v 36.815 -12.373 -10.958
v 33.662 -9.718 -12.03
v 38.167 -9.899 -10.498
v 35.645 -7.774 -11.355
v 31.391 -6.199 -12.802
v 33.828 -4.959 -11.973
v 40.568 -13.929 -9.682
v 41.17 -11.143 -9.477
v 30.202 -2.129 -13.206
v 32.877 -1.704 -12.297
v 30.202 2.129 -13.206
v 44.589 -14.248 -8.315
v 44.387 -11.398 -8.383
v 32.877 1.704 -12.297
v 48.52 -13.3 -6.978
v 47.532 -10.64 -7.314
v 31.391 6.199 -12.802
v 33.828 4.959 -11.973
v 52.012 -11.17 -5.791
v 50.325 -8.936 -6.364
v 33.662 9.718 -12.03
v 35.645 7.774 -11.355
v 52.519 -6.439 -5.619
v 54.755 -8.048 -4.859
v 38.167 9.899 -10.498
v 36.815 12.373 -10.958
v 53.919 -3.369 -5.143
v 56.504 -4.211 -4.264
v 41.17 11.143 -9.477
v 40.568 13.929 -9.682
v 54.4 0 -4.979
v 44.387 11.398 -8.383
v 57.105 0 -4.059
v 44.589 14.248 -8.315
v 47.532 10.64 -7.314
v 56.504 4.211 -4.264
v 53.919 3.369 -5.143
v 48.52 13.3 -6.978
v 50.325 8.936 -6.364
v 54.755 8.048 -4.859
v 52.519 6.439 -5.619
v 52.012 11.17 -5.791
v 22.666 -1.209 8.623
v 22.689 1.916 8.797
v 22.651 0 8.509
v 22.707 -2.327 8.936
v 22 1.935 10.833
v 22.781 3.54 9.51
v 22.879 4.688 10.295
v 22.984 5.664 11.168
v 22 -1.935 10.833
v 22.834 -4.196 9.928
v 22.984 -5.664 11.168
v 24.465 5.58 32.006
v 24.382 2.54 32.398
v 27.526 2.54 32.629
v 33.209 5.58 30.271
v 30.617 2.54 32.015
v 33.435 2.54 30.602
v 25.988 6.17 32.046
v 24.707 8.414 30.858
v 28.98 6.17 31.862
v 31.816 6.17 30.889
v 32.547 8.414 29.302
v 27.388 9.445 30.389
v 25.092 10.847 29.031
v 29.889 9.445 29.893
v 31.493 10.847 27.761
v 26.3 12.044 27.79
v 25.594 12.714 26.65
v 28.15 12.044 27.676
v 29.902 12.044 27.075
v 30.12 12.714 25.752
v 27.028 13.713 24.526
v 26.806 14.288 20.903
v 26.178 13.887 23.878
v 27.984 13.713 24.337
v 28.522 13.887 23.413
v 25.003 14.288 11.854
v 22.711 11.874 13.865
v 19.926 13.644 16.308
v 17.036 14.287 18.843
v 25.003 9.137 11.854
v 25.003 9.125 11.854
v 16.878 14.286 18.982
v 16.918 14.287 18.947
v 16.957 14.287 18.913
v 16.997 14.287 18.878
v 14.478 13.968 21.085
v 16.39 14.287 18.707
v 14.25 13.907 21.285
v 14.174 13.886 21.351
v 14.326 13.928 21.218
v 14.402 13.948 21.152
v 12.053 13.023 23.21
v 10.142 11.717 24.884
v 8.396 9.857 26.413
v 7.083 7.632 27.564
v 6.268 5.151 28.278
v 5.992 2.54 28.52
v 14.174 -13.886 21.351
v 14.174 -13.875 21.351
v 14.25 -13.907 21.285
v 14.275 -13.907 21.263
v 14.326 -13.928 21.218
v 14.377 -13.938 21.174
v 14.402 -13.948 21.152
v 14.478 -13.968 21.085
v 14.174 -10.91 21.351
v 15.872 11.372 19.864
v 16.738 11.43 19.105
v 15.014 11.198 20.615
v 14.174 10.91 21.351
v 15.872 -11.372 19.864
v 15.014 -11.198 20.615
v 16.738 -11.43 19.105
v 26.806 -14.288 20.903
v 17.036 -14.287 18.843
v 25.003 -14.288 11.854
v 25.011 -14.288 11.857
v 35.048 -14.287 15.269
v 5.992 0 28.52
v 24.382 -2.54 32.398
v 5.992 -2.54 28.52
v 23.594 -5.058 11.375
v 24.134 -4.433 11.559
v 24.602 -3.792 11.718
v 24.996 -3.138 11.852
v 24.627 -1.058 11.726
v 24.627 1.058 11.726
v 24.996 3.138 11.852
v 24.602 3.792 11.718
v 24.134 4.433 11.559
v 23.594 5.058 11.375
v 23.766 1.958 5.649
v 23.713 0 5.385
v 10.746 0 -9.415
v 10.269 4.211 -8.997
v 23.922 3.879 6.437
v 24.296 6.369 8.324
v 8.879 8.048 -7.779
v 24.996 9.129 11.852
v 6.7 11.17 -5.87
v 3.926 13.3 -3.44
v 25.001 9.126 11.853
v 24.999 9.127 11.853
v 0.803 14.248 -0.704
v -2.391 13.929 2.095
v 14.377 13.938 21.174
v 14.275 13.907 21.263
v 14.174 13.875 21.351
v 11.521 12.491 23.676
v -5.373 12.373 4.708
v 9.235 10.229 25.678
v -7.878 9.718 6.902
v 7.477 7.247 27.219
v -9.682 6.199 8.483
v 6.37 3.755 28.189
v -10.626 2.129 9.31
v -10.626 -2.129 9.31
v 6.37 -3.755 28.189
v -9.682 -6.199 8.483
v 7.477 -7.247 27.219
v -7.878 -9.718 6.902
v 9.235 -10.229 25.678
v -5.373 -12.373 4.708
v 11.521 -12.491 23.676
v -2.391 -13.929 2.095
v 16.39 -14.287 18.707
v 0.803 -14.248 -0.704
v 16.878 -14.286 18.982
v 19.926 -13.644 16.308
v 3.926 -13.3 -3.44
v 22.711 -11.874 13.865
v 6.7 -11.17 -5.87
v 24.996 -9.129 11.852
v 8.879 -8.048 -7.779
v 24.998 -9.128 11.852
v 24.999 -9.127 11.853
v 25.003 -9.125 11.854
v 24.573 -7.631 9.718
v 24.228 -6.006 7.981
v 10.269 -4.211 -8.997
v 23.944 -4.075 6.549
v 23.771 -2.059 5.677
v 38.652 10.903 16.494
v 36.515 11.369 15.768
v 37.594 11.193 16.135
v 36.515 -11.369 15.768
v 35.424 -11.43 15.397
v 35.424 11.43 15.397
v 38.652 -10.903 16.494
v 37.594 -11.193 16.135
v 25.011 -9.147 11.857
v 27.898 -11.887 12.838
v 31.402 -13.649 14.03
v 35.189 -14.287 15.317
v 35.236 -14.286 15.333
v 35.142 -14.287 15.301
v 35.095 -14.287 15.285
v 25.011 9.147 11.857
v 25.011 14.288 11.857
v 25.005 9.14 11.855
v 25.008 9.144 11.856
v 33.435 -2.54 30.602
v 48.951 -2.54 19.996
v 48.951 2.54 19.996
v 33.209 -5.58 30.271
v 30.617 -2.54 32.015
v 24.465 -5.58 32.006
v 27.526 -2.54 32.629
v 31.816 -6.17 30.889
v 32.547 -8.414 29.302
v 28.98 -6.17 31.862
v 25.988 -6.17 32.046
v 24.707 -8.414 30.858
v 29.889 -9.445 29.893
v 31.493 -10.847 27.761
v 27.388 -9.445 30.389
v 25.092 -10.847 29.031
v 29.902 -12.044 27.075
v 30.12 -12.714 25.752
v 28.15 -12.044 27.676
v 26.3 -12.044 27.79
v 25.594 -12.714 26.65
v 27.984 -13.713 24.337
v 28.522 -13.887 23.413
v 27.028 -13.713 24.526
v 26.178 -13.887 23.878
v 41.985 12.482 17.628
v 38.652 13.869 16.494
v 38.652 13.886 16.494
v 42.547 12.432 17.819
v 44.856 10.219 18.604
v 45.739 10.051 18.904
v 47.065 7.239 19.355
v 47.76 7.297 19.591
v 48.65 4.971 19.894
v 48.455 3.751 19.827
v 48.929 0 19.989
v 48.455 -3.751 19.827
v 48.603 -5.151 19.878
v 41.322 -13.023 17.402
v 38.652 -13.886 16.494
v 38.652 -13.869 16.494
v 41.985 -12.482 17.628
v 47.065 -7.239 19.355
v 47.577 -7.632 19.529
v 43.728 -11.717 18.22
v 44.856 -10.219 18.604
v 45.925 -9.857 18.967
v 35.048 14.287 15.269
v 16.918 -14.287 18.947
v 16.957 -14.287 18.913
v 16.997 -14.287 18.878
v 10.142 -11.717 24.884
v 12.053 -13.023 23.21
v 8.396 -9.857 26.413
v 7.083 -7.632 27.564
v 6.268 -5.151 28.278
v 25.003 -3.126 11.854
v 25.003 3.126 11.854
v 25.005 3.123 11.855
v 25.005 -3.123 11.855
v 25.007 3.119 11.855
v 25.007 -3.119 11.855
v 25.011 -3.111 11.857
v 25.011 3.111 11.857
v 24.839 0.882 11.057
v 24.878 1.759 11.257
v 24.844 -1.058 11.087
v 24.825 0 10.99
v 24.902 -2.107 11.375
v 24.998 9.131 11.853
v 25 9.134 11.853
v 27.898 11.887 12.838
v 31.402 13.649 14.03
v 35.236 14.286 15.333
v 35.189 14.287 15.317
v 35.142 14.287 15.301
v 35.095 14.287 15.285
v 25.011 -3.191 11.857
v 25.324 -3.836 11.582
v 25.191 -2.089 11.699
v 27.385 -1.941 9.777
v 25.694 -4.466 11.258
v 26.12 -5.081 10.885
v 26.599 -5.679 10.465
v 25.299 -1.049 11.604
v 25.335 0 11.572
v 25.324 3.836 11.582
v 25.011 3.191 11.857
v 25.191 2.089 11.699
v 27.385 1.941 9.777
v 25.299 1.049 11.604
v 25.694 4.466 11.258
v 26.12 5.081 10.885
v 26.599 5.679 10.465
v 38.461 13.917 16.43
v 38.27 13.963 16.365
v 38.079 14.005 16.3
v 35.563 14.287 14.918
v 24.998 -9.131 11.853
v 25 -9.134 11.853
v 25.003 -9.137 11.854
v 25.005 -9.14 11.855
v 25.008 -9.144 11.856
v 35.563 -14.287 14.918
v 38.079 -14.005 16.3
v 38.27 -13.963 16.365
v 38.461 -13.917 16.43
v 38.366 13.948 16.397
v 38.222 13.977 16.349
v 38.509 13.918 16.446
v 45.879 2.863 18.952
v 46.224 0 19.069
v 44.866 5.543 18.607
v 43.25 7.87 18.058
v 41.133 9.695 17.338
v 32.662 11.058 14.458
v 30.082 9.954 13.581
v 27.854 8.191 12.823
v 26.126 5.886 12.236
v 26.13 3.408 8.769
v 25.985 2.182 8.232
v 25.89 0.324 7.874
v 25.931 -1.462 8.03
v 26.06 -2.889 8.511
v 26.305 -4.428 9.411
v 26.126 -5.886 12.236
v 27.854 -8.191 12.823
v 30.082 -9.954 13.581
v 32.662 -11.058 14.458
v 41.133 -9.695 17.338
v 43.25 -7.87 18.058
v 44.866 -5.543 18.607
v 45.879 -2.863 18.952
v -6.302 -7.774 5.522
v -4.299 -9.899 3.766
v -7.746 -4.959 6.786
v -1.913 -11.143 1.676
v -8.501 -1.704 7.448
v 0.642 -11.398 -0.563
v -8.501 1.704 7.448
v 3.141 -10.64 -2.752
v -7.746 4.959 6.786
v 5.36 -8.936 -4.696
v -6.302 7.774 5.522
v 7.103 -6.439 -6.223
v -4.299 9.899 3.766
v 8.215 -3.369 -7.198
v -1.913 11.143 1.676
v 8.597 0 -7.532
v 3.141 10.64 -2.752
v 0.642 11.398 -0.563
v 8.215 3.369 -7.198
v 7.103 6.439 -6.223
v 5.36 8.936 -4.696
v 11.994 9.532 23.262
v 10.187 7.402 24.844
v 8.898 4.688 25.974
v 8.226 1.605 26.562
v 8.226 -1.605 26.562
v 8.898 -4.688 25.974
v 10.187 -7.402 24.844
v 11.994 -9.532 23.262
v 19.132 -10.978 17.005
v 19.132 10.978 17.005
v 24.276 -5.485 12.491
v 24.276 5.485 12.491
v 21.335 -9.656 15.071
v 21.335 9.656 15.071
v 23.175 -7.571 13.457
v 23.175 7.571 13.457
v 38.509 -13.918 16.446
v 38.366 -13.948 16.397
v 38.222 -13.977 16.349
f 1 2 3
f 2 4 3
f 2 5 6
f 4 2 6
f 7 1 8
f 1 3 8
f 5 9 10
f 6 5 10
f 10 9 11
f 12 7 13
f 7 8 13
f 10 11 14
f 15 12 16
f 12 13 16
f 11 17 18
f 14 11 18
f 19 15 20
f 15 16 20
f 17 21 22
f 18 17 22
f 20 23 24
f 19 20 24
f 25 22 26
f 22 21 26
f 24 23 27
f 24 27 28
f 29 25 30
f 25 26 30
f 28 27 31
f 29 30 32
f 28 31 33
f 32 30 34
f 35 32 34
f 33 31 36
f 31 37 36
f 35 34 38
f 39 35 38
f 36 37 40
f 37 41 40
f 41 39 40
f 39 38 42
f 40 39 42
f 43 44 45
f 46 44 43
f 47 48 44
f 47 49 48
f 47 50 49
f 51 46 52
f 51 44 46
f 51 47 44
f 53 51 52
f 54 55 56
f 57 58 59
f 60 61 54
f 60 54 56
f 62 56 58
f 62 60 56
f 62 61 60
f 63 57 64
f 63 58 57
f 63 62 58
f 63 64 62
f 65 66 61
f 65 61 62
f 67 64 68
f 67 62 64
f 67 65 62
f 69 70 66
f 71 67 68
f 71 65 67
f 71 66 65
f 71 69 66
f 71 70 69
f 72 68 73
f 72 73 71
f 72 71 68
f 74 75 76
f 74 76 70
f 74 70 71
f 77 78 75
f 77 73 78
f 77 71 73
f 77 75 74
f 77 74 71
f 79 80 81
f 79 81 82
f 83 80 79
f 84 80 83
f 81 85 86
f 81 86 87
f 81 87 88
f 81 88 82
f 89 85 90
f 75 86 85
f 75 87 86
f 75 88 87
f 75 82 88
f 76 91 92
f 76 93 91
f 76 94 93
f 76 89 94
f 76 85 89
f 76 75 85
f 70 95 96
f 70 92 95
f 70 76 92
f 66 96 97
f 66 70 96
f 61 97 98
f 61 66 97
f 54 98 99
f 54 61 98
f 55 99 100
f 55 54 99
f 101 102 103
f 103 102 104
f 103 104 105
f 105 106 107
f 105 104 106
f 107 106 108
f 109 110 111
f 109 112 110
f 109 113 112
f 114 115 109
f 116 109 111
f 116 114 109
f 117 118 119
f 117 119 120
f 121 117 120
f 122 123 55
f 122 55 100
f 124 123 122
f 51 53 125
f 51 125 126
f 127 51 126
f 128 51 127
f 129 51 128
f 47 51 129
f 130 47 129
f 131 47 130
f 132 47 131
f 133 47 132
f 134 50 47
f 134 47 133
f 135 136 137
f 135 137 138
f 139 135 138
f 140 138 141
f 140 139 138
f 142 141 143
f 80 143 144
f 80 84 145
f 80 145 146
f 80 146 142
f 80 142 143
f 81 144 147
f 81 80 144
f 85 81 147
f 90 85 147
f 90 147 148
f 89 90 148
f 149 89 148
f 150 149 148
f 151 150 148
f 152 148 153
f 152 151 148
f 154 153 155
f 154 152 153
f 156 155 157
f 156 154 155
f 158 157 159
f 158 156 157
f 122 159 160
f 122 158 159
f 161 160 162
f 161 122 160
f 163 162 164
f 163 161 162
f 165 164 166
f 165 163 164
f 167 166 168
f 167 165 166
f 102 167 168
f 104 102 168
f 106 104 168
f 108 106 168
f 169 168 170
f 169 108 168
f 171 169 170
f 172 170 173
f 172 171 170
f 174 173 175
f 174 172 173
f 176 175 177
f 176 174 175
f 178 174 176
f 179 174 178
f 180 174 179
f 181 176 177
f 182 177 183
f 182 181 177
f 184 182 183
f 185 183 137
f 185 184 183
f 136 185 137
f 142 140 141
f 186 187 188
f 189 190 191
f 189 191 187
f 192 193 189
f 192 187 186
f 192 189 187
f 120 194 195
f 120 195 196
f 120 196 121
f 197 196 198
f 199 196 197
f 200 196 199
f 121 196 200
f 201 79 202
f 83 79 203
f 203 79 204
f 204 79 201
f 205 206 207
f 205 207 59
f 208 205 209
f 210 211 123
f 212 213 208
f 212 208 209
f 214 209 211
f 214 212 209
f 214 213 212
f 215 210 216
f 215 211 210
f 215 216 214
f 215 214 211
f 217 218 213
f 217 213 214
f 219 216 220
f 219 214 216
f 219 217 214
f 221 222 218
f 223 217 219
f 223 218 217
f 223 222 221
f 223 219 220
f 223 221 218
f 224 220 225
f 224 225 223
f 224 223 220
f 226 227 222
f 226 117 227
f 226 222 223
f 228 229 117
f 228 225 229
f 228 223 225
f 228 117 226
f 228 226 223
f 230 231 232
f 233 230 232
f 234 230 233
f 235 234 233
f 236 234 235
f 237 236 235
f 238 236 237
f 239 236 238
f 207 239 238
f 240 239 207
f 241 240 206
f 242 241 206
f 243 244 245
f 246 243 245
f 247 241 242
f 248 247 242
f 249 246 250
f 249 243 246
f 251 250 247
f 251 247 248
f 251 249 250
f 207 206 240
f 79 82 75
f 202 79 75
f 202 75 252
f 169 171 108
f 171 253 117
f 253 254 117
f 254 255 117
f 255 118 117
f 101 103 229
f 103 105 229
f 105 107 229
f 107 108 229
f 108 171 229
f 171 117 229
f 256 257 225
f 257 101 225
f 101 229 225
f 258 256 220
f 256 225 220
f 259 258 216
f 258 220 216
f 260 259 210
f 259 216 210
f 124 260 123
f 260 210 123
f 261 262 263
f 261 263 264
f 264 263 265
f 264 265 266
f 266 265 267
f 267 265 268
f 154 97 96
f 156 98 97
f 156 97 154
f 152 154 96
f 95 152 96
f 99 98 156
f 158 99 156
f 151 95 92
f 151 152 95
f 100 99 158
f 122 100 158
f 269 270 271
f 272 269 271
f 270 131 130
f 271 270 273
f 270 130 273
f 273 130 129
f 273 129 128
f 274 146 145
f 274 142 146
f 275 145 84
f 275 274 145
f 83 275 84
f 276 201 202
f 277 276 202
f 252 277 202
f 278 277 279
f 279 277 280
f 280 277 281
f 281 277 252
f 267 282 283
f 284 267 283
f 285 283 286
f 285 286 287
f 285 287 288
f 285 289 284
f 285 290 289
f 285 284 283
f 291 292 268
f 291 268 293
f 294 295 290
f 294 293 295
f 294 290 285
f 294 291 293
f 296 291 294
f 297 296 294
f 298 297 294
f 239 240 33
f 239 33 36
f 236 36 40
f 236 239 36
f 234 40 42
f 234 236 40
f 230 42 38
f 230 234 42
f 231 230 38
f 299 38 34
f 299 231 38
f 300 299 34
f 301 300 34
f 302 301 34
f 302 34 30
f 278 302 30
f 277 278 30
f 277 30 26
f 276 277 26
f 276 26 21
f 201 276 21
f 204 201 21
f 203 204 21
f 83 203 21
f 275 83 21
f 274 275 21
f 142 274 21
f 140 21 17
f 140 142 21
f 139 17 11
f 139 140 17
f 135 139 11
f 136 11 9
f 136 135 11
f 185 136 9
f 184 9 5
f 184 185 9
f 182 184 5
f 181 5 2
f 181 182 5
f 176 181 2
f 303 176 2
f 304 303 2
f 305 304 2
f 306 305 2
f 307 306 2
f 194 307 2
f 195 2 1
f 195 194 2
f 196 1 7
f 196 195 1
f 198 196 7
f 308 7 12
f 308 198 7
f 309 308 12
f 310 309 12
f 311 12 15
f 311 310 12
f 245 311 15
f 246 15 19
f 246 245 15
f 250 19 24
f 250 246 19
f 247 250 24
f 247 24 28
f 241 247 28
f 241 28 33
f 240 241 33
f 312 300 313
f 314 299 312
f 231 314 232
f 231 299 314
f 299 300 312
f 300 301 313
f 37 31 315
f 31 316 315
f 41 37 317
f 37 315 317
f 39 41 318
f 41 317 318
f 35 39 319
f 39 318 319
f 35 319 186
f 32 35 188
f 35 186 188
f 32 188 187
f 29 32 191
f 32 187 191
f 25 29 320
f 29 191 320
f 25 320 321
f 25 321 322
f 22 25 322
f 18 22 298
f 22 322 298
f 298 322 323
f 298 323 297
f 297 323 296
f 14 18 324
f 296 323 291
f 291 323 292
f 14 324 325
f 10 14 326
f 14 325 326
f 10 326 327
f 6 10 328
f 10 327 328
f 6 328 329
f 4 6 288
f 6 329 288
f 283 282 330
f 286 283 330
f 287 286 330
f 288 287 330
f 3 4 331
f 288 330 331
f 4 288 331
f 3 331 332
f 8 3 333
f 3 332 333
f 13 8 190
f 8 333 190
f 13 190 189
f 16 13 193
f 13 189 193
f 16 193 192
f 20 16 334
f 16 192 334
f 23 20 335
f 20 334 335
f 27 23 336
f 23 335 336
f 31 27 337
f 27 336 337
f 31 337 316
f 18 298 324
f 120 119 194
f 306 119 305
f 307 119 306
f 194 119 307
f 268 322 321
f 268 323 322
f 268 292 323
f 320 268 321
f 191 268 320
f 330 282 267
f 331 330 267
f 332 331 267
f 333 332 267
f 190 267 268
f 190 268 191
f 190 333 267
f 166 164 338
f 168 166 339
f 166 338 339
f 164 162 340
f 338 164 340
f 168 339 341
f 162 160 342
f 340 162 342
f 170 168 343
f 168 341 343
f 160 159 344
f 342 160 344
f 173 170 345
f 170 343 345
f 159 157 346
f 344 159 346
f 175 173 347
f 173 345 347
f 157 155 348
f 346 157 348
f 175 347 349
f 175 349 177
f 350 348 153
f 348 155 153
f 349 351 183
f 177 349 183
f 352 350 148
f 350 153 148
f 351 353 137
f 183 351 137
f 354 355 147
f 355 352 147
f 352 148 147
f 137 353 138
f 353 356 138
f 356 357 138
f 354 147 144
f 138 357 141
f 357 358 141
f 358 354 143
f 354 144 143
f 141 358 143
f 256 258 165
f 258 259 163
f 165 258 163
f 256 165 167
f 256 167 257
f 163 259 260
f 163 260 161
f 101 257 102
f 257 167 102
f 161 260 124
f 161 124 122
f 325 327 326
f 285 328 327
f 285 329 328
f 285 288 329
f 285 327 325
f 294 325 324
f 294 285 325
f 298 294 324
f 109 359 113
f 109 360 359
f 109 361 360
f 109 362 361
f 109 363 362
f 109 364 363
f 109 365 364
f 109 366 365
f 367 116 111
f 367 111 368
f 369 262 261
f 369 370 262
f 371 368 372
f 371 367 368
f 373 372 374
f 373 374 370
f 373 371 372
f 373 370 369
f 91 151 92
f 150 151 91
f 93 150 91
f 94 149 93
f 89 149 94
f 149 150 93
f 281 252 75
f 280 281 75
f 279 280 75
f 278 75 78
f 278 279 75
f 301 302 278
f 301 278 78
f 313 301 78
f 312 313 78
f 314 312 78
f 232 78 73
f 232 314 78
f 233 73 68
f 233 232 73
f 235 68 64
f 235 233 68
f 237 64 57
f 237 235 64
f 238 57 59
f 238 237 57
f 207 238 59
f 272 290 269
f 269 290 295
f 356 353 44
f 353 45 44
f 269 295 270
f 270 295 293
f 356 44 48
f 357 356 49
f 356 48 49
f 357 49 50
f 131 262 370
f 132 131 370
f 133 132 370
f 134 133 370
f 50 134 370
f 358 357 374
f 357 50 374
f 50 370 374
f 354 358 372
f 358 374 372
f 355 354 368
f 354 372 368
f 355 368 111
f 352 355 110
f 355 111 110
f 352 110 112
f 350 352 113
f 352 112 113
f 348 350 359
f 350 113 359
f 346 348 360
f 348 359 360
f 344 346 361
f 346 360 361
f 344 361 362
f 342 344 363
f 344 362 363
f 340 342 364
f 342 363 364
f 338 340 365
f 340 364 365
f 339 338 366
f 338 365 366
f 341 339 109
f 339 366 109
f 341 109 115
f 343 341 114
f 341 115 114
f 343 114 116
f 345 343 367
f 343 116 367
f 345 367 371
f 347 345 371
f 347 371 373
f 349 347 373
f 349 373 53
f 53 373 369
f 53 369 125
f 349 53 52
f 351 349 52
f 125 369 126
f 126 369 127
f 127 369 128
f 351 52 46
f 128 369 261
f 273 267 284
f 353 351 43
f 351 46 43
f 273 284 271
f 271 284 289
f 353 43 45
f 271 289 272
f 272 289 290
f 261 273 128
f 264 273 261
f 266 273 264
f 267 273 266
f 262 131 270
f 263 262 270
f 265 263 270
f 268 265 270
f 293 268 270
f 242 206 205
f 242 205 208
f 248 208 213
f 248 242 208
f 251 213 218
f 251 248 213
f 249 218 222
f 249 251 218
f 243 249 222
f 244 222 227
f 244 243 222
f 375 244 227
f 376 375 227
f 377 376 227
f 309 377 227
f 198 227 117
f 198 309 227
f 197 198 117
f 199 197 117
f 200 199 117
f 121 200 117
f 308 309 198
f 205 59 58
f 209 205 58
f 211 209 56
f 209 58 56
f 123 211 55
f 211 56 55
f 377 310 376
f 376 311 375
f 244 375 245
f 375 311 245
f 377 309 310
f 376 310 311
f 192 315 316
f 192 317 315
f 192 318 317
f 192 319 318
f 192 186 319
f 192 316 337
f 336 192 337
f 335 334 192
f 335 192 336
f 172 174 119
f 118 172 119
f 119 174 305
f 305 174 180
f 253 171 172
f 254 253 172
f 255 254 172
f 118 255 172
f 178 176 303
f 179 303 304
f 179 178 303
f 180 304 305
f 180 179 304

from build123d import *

# Parameters (mm, degrees)
F2_R          = 14.2875
F2_R_2        = 11.43
F5_R          = 14.2875
F5_R_2        = 11.43
F7_DEPTH      = 14.2875
F7_DEPTH_BACK = 14.2875
F8_T1_DEPTH   = 48.1632201407
F8_T3_DEPTH   = 48.1632201407
F8_T5_DEPTH   = 5.08
F8_T10_DEPTH  = 11.7475
F8_T16_DEPTH  = 11.7475


# Not quite as in the source:
# - a fillet or chamfer that OpenCascade refuses, or shapes differently, is made with other operations: its cross-section is extruded or revolved along the edge and cut away or added


with BuildPart() as f3:
    # F3: sweep along a path in F0
    with BuildLine(Plane.XZ) as f3_path:
        Line((43.6000298417, -8.651005595), (35.4240159518, 15.3971294028))
    # F2 (on line) → F3 (sweep)
    with BuildSketch(Plane(origin=(7.1540121537, 0, -21.0421181231), x_dir=(0.9467769684, 0, 0.3218903106), z_dir=(-0.3218903106, 0, 0.9467769684))):
        with Locations((38.471757228, 0)):
            Circle(F2_R)
        with Locations((38.471757228, 0)):
            Circle(F2_R_2, mode=Mode.SUBTRACT)
    sweep(path=f3_path.line)

    # F6: sweep along a path in F0
    with BuildLine(Plane.XZ) as f6_path:
        Line((0, 0), (16.7382888768, 19.1047032292))
    # F5 (on face) → F6 (sweep)
    with BuildSketch(Plane(origin=(0, 0, 0), x_dir=(0.7521536704, 0, -0.6589877511), z_dir=(0.6589877511, 0, 0.7521536704))):
        Circle(F5_R)
        Circle(F5_R_2, mode=Mode.SUBTRACT)
    sweep(path=f6_path.line)

    # F0 (on Front) → F7 (join, two sides)
    with BuildSketch(Plane.XZ) as f7_sk:
        with BuildLine():
            Line((14.1742345569, 21.3511595802), (16.7382888768, 19.1047032292))
            Line((16.7382888768, 19.1047032292), (29.2920055344, 33.4332306512))
            Line((29.2920055344, 33.4332306512), (25.1637988833, 32.5627254125))
            add(Edge.make_bspline(
                [(14.1742345569, 21.3511595802), (18.1555587274, 26.691715757), (21.8910272526, 30.7931889907), (25.1637988833, 32.5627254125)],
                knots=[0.2192972469, 0.2192972469, 0.2192972469, 0.2192972469, 0.4127143591, 0.4127143591, 0.4127143591, 0.4127143591], degree=3))
        make_face()
        Polygon((29.2920055344, 33.4332306512), (16.7382888768, 19.1047032292), (25.0025134025, 11.8539710829), (25.0108680409, 11.8568115377), align=None)
        with BuildLine():
            Line((5.9918933103, 28.5199907224), (14.1742345569, 21.3511595802))
            add(Edge.make_bspline(
                [(14.1742345569, 21.3511595802), (18.1555587274, 26.691715757), (21.8910272526, 30.7931889907), (25.1637988833, 32.5627254125)],
                knots=[0.2192972469, 0.2192972469, 0.2192972469, 0.2192972469, 0.4127143591, 0.4127143591, 0.4127143591, 0.4127143591], degree=3))
            Line((25.1637988833, 32.5627254125), (5.9918933103, 28.5199907224))
        make_face()
        with BuildLine():
            Line((32.7751119786, 31.0525082771), (29.2920055344, 33.4332306512))
            Line((29.2920055344, 33.4332306512), (35.4240159518, 15.3971294028))
            Line((35.4240159518, 15.3971294028), (38.6515313802, 16.4944374051))
            add(Edge.make_bspline(
                [(32.7751119786, 31.0525082771), (35.1243349239, 28.1674701754), (37.0108609747, 22.9504952618), (38.6515313802, 16.4944374051)],
                knots=[0.5872856409, 0.5872856409, 0.5872856409, 0.5872856409, 0.7807027531, 0.7807027531, 0.7807027531, 0.7807027531], degree=3))
        make_face()
        Polygon((35.4240159518, 15.3971294028), (29.2920055344, 33.4332306512), (25.0108680409, 11.8568115377), align=None)
        with BuildLine():
            Line((48.951091888, 19.9961372159), (32.7751119786, 31.0525082771))
            add(Edge.make_bspline(
                [(32.7751119786, 31.0525082771), (35.1243349239, 28.1674701754), (37.0108609747, 22.9504952618), (38.6515313802, 16.4944374051)],
                knots=[0.5872856409, 0.5872856409, 0.5872856409, 0.5872856409, 0.7807027531, 0.7807027531, 0.7807027531, 0.7807027531], degree=3))
            Line((38.6515313802, 16.4944374051), (48.951091888, 19.9961372159))
        make_face()
    extrude(amount=F7_DEPTH)
    extrude(f7_sk.sketch, amount=-F7_DEPTH_BACK)

    # F8: fillet of radius 11.7475 on 5 edges, made by hand

    # F8_s2 → F8_t1 (cut)
    with BuildSketch(Plane(origin=(48.2948087603, 0, -33.0097668872), x_dir=(0, 1, 0), z_dir=(-0.8255784296, 0, 0.5642873884))):
        with BuildLine():
            ThreePointArc((14.2875, -32.3833633586), (10.846736912, -40.6901002706), (2.54, -44.1308633586))
            Line((2.54, -44.1308633586), (14.2875, -44.1308633586))
            Line((14.2875, -44.1308633586), (14.2875, -32.3833633586))
        make_face()
        with BuildLine():
            ThreePointArc((-2.54, -44.1308633586), (-10.846736912, -40.6901002706), (-14.2875, -32.3833633586))
            Line((-14.2875, -32.3833633586), (-14.2875, -44.1308633586))
            Line((-14.2875, -44.1308633586), (-2.54, -44.1308633586))
        make_face()
    extrude(amount=F8_T1_DEPTH, mode=Mode.SUBTRACT)

    # F8_s4 → F8_t3 (cut)
    with BuildSketch(Plane(origin=(29.884780339, 0, 6.3017334256), x_dir=(0, 1, 0), z_dir=(-0.9784824031, 0, -0.2063302857))):
        with BuildLine():
            ThreePointArc((14.2875, -14.9225), (10.846736912, -23.229236912), (2.54, -26.67))
            Line((2.54, -26.67), (14.2875, -26.67))
            Line((14.2875, -26.67), (14.2875, -14.9225))
        make_face()
        with BuildLine():
            ThreePointArc((-14.2875, -14.9225), (-10.846736912, -23.229236912), (-2.54, -26.67))
            Line((-2.54, -26.67), (-14.2875, -26.67))
            Line((-14.2875, -26.67), (-14.2875, -14.9225))
        make_face()
    extrude(amount=F8_T3_DEPTH, mode=Mode.SUBTRACT)

    # F8_s6 → F8_t5 (cut)
    with BuildSketch(Plane.XZ.offset(-2.54)):
        with BuildLine():
            ThreePointArc((33.434782745, 30.6016196872), (29.0921538432, 32.4260021156), (24.3819516188, 32.3978591166))
            Line((24.3819516188, 32.3978591166), (29.2920055344, 33.4332306512))
            Line((29.2920055344, 33.4332306512), (33.434782745, 30.6016196872))
        make_face()
    extrude(amount=F8_T5_DEPTH, mode=Mode.SUBTRACT)


with BuildPart() as f8_tool8:
    # F8_s9 → F8_t10 (new body)
    with BuildSketch(Plane.XZ.offset(-2.54)):
        Polygon((26.8058166503, 20.903137086), (33.434782745, 30.6016196872), (29.2920055344, 33.4332306512), (24.3819516188, 32.3978591166), align=None)
    extrude(amount=-F8_T10_DEPTH)

    # F8_s11 → F8_t12 (revolve, cut)
    with BuildSketch(Plane(origin=(26.8058166503, 2.54, 20.903137086), x_dir=(-0.194623298, 0, -0.9808780617), z_dir=(0.9808780617, 0, -0.194623298))):
        with BuildLine():
            ThreePointArc((0, -11.7475), (11.7475, 0), (0, 11.7475))
            Line((0, 11.7475), (0, -11.7475))
        make_face()
    revolve(axis=Axis((26.8058166503, 2.54, 20.903137086), (0, 1, 0)), mode=Mode.SUBTRACT)


with BuildPart() as f3_1:
    add(f3.part)

    # F8_t7: cut F8_tool8
    add(f8_tool8.part, mode=Mode.SUBTRACT)


with BuildPart() as f8_tool14:
    # F8_s15 → F8_t16 (new body)
    with BuildSketch(Plane.XZ.offset(2.54)):
        Polygon((26.8058166503, 20.903137086), (24.3819516188, 32.3978591166), (29.2920055344, 33.4332306512), (33.434782745, 30.6016196872), align=None)
    extrude(amount=F8_T16_DEPTH)

    # F8_s17 → F8_t18 (revolve, cut)
    with BuildSketch(Plane(origin=(26.8058166503, -2.54, 20.903137086), x_dir=(-0.194623298, 0, -0.9808780617), z_dir=(-0.9808780617, 0, 0.194623298))):
        with BuildLine():
            ThreePointArc((0, -11.7475), (11.7475, 0), (0, 11.7475))
            Line((0, 11.7475), (0, -11.7475))
        make_face()
    revolve(axis=Axis((26.8058166503, -2.54, 20.903137086), (0, -1, 0)), mode=Mode.SUBTRACT)


with BuildPart() as f3_2:
    add(f3_1.part)

    # F8_t13: cut F8_tool14
    add(f8_tool14.part, mode=Mode.SUBTRACT)


solid = f3_2.part
